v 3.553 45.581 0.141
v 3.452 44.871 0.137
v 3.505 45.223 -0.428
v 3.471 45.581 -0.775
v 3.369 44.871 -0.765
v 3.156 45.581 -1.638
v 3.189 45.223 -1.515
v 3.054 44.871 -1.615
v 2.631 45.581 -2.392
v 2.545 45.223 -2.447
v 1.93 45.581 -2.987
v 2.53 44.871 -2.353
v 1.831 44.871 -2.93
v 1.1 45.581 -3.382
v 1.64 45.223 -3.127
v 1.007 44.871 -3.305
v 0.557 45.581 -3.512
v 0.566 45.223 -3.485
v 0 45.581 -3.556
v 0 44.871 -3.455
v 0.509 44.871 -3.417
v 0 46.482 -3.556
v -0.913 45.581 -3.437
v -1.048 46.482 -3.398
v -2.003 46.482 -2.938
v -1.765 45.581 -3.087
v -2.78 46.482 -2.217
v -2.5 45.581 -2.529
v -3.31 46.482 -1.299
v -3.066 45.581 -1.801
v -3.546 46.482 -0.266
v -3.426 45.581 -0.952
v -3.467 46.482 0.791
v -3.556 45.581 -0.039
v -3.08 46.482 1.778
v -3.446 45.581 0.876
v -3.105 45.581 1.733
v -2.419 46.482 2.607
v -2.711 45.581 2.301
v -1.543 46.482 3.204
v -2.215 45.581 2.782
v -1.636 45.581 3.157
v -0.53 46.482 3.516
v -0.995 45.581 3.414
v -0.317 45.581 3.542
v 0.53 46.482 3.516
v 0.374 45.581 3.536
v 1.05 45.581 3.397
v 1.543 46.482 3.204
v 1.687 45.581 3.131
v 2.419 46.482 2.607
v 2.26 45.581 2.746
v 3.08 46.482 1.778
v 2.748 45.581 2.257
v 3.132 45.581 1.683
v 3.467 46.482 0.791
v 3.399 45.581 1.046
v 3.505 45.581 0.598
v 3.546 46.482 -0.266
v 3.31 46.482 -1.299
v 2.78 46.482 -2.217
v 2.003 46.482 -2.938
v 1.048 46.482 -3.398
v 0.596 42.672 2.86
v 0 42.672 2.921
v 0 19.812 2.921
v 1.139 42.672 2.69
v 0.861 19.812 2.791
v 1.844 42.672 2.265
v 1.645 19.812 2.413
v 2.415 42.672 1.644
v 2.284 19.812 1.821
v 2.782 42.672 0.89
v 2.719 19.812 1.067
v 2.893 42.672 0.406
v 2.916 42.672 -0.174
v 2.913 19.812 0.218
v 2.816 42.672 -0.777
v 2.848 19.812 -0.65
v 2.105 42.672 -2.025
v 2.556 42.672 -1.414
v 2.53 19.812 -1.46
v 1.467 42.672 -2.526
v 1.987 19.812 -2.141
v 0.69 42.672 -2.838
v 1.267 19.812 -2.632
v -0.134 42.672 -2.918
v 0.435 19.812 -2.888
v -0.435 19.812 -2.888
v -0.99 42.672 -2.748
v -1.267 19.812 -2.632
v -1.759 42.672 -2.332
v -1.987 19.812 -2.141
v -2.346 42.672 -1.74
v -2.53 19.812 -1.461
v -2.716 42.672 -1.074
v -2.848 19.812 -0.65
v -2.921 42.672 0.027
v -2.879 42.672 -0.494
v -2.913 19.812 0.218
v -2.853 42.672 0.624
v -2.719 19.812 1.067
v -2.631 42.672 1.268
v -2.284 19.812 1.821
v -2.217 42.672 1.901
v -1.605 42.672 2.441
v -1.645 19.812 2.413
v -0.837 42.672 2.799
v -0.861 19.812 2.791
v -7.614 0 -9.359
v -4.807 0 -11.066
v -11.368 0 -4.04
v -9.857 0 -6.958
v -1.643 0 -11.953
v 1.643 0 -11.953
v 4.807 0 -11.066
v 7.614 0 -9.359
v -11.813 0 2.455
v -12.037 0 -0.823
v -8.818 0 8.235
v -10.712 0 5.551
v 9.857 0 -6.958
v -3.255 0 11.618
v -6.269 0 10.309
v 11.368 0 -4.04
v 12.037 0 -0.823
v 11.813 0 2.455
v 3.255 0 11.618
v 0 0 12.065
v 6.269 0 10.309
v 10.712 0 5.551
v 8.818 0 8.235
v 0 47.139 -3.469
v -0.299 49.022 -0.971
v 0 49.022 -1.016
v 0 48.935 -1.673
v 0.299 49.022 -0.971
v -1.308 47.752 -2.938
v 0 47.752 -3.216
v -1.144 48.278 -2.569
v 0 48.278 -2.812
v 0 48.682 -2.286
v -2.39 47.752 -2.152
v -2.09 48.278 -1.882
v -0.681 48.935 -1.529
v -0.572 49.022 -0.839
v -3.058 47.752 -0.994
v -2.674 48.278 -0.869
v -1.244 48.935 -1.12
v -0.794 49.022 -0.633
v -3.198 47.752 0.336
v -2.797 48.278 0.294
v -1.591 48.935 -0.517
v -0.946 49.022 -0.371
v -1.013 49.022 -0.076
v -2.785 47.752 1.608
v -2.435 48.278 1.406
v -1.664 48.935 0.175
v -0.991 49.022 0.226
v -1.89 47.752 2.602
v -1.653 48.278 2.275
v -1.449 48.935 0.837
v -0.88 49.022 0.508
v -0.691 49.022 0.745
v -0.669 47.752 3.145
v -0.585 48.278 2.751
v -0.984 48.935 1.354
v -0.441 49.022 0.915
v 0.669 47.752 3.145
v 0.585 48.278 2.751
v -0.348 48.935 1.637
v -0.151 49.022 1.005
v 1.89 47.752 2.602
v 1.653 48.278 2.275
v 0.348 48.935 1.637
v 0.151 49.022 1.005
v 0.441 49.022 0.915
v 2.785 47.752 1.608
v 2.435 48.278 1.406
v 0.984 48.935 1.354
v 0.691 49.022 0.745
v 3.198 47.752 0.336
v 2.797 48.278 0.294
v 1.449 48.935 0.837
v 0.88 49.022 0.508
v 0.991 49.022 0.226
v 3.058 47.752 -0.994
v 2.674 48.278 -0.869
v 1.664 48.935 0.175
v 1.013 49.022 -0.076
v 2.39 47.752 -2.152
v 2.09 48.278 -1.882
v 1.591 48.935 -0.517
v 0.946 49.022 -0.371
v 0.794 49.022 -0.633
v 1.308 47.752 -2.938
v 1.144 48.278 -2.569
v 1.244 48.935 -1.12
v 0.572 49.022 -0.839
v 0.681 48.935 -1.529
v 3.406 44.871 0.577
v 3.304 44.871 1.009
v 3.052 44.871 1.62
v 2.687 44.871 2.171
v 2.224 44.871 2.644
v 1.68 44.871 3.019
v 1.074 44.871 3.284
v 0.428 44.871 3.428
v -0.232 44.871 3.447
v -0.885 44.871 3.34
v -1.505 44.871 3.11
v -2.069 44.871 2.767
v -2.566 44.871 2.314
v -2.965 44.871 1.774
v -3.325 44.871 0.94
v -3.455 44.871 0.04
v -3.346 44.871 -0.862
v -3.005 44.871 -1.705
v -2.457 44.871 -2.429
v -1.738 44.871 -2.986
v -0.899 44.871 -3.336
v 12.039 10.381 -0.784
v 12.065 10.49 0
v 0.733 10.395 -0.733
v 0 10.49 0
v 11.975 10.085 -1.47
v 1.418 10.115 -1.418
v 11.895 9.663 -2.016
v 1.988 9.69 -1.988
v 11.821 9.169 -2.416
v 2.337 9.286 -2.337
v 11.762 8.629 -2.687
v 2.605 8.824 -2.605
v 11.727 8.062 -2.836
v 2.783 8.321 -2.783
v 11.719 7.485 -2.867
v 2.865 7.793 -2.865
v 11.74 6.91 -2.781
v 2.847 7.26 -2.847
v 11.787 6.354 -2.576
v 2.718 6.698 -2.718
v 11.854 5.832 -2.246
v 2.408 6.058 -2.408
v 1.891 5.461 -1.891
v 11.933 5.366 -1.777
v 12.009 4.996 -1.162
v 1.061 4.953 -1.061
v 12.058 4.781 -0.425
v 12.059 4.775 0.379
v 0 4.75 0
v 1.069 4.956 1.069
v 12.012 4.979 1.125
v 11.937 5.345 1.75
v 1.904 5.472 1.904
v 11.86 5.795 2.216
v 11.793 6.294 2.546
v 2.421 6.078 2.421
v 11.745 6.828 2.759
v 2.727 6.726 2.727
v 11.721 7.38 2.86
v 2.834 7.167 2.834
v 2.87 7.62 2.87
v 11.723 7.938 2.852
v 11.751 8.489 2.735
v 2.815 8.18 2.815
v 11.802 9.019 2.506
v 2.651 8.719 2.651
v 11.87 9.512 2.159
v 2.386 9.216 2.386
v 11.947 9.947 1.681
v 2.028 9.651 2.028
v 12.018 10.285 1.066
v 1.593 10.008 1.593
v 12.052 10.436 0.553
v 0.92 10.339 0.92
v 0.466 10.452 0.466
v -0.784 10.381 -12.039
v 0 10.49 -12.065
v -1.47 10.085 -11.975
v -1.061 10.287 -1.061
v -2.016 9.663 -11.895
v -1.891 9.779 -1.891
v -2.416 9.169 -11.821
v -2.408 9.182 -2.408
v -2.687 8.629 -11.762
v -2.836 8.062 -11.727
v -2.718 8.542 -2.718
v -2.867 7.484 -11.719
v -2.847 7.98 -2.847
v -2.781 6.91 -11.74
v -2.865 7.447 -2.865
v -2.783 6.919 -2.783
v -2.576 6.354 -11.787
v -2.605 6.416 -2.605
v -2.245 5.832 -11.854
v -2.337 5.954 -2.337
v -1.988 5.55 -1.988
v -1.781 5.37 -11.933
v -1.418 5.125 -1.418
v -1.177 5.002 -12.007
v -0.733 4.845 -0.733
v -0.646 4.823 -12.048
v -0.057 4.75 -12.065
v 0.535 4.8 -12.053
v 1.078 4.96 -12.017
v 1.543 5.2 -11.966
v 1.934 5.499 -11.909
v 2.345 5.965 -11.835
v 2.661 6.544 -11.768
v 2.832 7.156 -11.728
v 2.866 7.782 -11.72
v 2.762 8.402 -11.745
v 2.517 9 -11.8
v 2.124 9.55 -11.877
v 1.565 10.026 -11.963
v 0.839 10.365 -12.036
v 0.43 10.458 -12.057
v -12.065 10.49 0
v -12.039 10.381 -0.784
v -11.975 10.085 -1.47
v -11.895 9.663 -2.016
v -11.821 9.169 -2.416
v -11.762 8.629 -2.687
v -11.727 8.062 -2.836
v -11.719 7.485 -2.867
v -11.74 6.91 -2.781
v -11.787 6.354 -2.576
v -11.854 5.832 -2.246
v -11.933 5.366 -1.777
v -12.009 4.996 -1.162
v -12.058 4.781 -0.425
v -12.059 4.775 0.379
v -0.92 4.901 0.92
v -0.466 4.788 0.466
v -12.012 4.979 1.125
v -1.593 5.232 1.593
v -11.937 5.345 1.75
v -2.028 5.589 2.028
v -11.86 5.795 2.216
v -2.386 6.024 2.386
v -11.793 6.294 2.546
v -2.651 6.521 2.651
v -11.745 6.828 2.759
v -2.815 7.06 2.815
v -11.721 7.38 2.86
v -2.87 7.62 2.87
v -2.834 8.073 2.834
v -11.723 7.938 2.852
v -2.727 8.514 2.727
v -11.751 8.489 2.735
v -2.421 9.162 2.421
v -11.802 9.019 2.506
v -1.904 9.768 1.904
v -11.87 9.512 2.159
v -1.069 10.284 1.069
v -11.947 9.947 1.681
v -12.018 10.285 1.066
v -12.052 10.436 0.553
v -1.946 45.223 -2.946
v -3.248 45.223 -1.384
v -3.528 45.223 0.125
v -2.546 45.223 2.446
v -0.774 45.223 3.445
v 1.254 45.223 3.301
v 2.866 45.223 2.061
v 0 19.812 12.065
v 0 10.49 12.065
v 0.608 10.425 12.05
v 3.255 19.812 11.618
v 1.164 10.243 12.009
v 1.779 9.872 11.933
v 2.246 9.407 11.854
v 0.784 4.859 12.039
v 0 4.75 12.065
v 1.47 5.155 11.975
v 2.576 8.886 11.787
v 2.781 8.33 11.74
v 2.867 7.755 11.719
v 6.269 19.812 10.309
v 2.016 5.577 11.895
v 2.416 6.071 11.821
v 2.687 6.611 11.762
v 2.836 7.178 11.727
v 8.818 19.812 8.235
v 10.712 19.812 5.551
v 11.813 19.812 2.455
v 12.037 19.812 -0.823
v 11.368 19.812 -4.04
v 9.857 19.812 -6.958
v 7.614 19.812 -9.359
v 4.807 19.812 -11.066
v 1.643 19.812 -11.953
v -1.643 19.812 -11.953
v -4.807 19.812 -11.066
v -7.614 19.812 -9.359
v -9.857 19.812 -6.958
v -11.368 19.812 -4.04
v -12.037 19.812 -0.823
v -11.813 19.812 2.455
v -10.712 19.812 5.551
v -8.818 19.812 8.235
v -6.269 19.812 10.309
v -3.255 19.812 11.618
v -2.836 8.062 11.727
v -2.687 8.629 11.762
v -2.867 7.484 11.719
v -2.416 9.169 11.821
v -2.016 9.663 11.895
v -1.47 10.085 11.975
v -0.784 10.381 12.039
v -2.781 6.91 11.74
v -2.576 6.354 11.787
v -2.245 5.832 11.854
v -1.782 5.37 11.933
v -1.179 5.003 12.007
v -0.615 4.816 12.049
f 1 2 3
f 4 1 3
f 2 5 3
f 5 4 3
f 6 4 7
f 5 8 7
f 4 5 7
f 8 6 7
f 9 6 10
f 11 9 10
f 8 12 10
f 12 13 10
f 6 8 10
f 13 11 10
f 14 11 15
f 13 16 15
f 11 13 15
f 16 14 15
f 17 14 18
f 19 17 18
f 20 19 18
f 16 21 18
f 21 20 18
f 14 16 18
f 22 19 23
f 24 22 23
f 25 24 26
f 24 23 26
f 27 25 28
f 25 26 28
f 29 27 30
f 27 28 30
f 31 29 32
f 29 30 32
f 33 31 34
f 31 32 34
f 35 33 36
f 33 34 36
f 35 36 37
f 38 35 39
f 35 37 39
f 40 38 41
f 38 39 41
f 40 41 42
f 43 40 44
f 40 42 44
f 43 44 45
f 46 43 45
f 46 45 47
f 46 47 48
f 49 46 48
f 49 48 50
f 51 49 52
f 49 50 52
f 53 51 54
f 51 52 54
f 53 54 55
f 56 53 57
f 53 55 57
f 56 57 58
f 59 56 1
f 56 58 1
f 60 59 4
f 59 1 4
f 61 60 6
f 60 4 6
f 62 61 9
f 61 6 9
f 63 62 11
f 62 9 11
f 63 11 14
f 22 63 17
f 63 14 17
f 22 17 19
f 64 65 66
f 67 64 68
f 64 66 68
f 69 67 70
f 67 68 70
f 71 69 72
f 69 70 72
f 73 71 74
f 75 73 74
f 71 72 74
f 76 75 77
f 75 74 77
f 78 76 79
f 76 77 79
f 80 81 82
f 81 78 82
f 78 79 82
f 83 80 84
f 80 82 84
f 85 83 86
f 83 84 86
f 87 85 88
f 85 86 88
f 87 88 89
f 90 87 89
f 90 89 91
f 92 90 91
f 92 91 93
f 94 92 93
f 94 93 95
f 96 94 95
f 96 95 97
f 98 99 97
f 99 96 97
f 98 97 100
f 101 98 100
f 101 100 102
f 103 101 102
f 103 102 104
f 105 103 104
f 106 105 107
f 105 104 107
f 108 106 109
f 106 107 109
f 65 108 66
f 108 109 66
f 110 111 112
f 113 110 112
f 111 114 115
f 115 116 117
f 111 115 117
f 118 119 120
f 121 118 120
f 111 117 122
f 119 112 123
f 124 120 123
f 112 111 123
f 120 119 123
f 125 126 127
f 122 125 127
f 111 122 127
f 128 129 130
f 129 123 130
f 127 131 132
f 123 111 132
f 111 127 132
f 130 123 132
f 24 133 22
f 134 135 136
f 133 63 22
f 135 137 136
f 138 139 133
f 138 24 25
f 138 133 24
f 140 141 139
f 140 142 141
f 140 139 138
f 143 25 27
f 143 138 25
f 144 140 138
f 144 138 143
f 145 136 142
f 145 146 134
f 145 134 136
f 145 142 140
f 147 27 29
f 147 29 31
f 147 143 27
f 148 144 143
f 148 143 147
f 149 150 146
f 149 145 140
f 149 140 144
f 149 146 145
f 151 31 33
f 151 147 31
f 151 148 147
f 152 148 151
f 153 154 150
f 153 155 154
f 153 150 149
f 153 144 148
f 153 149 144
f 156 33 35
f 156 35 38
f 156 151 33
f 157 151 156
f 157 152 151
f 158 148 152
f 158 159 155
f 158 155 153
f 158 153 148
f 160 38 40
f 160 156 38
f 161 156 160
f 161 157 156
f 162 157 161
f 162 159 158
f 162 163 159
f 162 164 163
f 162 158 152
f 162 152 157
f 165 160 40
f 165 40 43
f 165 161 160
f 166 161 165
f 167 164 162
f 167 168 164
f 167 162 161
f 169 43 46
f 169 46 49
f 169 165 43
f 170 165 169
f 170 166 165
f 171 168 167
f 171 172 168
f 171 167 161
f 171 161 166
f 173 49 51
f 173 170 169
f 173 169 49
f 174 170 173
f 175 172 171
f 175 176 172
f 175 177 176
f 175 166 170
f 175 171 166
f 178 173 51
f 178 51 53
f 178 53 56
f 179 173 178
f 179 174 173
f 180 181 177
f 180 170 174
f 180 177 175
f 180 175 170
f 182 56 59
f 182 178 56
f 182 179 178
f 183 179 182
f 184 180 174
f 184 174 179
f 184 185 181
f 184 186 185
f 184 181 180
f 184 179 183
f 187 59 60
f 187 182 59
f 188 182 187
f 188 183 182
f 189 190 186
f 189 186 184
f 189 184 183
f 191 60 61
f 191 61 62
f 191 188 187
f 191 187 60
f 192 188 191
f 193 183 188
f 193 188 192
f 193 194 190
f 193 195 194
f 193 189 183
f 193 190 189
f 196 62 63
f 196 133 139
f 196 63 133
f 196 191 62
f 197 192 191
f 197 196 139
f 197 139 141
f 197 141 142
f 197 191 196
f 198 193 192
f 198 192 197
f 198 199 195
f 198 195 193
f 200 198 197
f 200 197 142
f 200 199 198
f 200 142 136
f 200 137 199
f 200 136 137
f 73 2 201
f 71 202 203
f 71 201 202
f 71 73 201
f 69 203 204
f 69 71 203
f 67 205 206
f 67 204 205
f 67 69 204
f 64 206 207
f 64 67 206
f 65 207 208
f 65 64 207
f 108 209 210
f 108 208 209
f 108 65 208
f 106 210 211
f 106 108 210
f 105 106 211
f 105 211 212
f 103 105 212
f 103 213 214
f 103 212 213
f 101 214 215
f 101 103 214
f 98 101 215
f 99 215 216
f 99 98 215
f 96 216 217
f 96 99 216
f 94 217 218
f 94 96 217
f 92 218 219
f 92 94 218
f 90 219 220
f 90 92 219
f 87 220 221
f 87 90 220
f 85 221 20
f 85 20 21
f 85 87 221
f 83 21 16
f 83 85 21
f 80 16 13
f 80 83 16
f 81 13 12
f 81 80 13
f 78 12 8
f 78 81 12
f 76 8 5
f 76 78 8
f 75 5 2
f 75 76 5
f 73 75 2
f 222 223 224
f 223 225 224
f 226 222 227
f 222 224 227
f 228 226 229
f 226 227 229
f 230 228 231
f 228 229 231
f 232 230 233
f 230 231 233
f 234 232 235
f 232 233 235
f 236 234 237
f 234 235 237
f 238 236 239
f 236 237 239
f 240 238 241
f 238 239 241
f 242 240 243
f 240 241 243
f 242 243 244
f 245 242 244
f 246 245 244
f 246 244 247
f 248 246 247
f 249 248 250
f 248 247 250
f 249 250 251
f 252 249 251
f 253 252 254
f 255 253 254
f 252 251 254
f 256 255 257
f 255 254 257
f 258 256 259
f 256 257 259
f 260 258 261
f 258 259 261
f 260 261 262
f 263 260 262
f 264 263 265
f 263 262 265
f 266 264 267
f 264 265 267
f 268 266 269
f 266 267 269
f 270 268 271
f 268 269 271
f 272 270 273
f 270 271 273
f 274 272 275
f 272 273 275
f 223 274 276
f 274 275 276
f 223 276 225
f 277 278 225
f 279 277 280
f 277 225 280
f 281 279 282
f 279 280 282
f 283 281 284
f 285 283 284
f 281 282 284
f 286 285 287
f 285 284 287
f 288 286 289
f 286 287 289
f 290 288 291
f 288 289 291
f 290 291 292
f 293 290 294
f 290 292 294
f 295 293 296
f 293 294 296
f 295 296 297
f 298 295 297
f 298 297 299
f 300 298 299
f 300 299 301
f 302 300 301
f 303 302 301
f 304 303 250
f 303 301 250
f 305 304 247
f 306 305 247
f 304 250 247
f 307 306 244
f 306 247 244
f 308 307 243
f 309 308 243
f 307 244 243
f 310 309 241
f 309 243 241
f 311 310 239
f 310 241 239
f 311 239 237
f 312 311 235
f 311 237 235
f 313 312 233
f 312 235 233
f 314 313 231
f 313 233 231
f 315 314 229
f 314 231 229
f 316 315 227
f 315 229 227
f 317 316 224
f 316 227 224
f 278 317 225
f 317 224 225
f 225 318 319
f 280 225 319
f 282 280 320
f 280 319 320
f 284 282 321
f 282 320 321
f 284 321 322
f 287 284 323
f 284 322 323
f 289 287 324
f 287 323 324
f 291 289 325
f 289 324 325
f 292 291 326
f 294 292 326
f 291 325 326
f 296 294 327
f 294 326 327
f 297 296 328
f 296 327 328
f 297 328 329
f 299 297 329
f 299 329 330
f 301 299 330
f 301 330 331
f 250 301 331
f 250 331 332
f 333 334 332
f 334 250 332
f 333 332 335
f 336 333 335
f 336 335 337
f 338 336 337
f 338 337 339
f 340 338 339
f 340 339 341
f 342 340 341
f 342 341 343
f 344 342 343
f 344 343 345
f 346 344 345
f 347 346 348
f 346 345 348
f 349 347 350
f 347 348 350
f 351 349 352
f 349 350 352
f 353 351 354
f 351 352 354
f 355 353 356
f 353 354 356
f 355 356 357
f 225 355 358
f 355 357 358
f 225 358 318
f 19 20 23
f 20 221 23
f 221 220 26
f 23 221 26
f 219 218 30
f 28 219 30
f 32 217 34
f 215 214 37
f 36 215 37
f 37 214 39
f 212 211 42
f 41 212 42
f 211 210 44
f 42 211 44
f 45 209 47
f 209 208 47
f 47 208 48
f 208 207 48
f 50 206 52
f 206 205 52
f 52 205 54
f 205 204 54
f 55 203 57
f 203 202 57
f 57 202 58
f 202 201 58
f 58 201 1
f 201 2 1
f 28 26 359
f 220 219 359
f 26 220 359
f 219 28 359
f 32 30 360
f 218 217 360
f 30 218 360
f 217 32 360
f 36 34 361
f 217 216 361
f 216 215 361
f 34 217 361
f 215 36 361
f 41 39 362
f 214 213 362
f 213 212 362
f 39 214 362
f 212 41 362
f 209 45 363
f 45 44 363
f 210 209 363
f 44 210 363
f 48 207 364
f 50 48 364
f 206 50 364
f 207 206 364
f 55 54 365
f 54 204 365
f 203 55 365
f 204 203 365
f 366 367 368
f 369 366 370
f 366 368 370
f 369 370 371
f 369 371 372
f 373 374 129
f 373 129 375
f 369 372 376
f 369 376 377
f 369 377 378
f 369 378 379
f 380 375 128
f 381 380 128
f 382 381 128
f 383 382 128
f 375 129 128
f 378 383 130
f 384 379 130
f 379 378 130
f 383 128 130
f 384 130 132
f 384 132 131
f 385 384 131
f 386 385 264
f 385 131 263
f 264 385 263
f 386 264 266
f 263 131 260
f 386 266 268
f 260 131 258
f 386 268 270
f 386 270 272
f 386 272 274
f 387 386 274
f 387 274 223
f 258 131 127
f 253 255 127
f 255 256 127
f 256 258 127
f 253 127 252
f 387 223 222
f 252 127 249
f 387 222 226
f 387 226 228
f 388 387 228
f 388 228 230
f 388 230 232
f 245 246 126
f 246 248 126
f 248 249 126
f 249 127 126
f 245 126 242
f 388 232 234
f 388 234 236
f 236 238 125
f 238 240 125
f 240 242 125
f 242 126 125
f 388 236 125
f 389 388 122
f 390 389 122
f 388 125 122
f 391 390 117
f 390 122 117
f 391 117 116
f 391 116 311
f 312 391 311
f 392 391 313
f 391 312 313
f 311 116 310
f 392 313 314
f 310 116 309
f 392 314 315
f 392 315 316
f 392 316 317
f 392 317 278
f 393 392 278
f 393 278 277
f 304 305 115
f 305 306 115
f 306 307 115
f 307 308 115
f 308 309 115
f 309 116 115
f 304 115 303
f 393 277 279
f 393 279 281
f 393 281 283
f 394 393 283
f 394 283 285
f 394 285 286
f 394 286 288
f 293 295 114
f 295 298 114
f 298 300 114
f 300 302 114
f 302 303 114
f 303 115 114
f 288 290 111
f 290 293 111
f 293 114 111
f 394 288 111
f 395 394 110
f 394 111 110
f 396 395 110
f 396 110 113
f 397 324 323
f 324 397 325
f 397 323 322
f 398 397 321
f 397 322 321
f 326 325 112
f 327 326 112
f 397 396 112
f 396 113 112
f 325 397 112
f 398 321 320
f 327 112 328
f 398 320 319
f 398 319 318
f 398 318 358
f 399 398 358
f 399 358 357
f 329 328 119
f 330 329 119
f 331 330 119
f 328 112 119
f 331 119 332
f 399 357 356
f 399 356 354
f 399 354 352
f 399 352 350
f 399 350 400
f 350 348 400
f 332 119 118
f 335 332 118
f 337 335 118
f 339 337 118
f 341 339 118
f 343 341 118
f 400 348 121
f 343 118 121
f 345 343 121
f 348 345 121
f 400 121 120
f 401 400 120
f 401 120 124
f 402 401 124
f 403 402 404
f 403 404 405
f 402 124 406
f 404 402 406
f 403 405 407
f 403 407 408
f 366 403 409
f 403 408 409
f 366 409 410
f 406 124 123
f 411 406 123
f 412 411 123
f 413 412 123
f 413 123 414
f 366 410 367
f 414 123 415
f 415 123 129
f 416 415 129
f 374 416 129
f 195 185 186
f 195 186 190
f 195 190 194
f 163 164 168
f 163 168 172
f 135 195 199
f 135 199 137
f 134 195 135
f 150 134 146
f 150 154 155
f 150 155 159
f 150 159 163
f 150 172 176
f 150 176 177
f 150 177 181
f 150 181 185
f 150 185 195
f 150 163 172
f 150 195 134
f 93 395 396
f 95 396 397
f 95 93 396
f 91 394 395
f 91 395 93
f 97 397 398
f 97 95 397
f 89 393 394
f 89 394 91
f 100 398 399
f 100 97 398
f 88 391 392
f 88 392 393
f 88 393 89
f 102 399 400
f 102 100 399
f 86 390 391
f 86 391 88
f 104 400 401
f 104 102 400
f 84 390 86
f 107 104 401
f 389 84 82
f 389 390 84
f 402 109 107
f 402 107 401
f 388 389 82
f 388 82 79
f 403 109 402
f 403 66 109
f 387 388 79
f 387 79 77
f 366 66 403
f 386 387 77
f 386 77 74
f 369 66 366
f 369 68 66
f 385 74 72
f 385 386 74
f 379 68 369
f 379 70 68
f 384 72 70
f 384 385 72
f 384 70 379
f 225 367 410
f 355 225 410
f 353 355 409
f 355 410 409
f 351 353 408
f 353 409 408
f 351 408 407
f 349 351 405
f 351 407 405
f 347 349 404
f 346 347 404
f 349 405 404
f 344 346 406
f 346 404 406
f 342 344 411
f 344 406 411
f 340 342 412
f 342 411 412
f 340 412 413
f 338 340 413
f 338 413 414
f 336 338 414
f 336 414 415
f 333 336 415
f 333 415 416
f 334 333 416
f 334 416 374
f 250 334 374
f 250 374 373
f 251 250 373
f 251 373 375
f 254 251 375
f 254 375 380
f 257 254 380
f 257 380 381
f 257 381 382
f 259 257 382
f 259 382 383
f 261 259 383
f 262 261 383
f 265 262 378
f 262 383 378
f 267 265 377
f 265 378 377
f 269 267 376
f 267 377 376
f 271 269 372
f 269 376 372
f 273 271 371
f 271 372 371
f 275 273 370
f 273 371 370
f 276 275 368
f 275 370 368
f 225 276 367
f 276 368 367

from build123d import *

# Parameters (mm, degrees)
SKETCH1_R           = 12.065
BOSS_EXTRUDE1_DEPTH = 19.812
SKETCH2_R           = 2.921
BOSS_EXTRUDE2_DEPTH = 25.4
SKETCH3_R           = 3.556
BOSS_EXTRUDE3_DEPTH = 3.81
FILLET3_R           = 2.54
SKETCH7_R           = 2.8702
CUT_EXTRUDE1_DEPTH  = 12.7
CIRPATTERN1_COUNT   = 2
CIRPATTERN1_ANGLE   = 90
FILLET4_R           = 2.54


with BuildPart() as part:
    # Sketch1 → Boss-Extrude1 (new body)
    with BuildSketch(Plane(origin=(0, 0, 0), x_dir=(1, 0, 0), z_dir=(0, 1, 0))):
        with Locations(Location((0, 0, 0), (0, 0, 270))):
            Circle(SKETCH1_R)
    extrude(amount=BOSS_EXTRUDE1_DEPTH)

    # Sketch2 → Boss-Extrude2 (add)
    with BuildSketch(Plane(origin=(0, 19.812, 0), x_dir=(1, 0, 0), z_dir=(0, 1, 0))):
        with Locations(Location((0, 0, 0), (0, 0, 270))):
            Circle(SKETCH2_R)
    extrude(amount=BOSS_EXTRUDE2_DEPTH)

    # Sketch3 → Boss-Extrude3 (add)
    with BuildSketch(Plane(origin=(0, 45.212, 0), x_dir=(1, 0, 0), z_dir=(0, 1, 0))):
        with Locations(Location((0, 0, 0), (0, 0, 90))):
            Circle(SKETCH3_R)
    extrude(amount=BOSS_EXTRUDE3_DEPTH)

    # Fillet3
    fillet3_edges = [part.edges().sort_by_distance(p)[0] for p in [
        (0, 49.022, 3.556),
    ]]
    fillet(fillet3_edges, radius=FILLET3_R)

    # Sketch7 → Cut-Extrude1 (cut, symmetric)
    with BuildSketch(Plane.XY):
        with Locations(Location((0, 7.62, 0), (0, 0, 90.000000025))):
            Circle(SKETCH7_R)
    cut_extrude1 = extrude(amount=CUT_EXTRUDE1_DEPTH, both=True, mode=Mode.SUBTRACT)

    # CirPattern1: Cut-Extrude1 ×2 about axis
    cirpattern1_axis = Axis((0, 45.212, 0), (0, -1, 0))
    for i in range(1, CIRPATTERN1_COUNT):
        add(cut_extrude1.rotate(cirpattern1_axis, i * CIRPATTERN1_ANGLE / (CIRPATTERN1_COUNT - 1)), mode=Mode.SUBTRACT)

    # Loft1: read off the stored shape, not the designer's step
    # Loft1: loft between two sections, ruled curve by curve
    loft1_from = [
        Edge.make_bspline([(3.555943144, 45.212, 0.020108599), (3.515725946, 45.212, 7.131994887), (-3.596160342, 45.212, 7.091777689), (-3.555943144, 45.212, -0.020108599), (-3.515725946, 45.212, -7.131994887), (3.596160342, 45.212, -7.091777689), (3.555943144, 45.212, 0.020108599)], [0, 0, 0, 0, 0.5, 0.5, 0.5, 1, 1, 1, 1], 3, [1, 0.333333333, 0.333333333, 1, 0.333333333, 0.333333333, 1]),
    ]
    loft1_to = [
        Edge.make_bspline([(2.781979214, 42.672, 0.890411509), (1.001156196, 42.672, 6.454369936), (-4.562802231, 42.672, 4.673546919), (-2.781979214, 42.672, -0.890411509), (-1.001156196, 42.672, -6.454369936), (4.562802231, 42.672, -4.673546919), (2.781979214, 42.672, 0.890411509)], [0, 0, 0, 0, 0.5, 0.5, 0.5, 1, 1, 1, 1], 3, [1, 0.333333333, 0.333333333, 1, 0.333333333, 0.333333333, 1]),
    ]
    loft1 = Solid(Shell([*[Face.make_surface_from_curves(loft1_from[k], loft1_to[k]) for k in range(1)], Face(Wire(loft1_from)), Face(Wire(loft1_to))]))
    add(loft1)

    # Fillet4
    fillet4_edges = [part.edges().sort_by_distance(p)[0] for p in [
        (-2.521571155, 45.212, 2.507352171),
    ]]
    fillet(fillet4_edges, radius=FILLET4_R)


solid = part.part
